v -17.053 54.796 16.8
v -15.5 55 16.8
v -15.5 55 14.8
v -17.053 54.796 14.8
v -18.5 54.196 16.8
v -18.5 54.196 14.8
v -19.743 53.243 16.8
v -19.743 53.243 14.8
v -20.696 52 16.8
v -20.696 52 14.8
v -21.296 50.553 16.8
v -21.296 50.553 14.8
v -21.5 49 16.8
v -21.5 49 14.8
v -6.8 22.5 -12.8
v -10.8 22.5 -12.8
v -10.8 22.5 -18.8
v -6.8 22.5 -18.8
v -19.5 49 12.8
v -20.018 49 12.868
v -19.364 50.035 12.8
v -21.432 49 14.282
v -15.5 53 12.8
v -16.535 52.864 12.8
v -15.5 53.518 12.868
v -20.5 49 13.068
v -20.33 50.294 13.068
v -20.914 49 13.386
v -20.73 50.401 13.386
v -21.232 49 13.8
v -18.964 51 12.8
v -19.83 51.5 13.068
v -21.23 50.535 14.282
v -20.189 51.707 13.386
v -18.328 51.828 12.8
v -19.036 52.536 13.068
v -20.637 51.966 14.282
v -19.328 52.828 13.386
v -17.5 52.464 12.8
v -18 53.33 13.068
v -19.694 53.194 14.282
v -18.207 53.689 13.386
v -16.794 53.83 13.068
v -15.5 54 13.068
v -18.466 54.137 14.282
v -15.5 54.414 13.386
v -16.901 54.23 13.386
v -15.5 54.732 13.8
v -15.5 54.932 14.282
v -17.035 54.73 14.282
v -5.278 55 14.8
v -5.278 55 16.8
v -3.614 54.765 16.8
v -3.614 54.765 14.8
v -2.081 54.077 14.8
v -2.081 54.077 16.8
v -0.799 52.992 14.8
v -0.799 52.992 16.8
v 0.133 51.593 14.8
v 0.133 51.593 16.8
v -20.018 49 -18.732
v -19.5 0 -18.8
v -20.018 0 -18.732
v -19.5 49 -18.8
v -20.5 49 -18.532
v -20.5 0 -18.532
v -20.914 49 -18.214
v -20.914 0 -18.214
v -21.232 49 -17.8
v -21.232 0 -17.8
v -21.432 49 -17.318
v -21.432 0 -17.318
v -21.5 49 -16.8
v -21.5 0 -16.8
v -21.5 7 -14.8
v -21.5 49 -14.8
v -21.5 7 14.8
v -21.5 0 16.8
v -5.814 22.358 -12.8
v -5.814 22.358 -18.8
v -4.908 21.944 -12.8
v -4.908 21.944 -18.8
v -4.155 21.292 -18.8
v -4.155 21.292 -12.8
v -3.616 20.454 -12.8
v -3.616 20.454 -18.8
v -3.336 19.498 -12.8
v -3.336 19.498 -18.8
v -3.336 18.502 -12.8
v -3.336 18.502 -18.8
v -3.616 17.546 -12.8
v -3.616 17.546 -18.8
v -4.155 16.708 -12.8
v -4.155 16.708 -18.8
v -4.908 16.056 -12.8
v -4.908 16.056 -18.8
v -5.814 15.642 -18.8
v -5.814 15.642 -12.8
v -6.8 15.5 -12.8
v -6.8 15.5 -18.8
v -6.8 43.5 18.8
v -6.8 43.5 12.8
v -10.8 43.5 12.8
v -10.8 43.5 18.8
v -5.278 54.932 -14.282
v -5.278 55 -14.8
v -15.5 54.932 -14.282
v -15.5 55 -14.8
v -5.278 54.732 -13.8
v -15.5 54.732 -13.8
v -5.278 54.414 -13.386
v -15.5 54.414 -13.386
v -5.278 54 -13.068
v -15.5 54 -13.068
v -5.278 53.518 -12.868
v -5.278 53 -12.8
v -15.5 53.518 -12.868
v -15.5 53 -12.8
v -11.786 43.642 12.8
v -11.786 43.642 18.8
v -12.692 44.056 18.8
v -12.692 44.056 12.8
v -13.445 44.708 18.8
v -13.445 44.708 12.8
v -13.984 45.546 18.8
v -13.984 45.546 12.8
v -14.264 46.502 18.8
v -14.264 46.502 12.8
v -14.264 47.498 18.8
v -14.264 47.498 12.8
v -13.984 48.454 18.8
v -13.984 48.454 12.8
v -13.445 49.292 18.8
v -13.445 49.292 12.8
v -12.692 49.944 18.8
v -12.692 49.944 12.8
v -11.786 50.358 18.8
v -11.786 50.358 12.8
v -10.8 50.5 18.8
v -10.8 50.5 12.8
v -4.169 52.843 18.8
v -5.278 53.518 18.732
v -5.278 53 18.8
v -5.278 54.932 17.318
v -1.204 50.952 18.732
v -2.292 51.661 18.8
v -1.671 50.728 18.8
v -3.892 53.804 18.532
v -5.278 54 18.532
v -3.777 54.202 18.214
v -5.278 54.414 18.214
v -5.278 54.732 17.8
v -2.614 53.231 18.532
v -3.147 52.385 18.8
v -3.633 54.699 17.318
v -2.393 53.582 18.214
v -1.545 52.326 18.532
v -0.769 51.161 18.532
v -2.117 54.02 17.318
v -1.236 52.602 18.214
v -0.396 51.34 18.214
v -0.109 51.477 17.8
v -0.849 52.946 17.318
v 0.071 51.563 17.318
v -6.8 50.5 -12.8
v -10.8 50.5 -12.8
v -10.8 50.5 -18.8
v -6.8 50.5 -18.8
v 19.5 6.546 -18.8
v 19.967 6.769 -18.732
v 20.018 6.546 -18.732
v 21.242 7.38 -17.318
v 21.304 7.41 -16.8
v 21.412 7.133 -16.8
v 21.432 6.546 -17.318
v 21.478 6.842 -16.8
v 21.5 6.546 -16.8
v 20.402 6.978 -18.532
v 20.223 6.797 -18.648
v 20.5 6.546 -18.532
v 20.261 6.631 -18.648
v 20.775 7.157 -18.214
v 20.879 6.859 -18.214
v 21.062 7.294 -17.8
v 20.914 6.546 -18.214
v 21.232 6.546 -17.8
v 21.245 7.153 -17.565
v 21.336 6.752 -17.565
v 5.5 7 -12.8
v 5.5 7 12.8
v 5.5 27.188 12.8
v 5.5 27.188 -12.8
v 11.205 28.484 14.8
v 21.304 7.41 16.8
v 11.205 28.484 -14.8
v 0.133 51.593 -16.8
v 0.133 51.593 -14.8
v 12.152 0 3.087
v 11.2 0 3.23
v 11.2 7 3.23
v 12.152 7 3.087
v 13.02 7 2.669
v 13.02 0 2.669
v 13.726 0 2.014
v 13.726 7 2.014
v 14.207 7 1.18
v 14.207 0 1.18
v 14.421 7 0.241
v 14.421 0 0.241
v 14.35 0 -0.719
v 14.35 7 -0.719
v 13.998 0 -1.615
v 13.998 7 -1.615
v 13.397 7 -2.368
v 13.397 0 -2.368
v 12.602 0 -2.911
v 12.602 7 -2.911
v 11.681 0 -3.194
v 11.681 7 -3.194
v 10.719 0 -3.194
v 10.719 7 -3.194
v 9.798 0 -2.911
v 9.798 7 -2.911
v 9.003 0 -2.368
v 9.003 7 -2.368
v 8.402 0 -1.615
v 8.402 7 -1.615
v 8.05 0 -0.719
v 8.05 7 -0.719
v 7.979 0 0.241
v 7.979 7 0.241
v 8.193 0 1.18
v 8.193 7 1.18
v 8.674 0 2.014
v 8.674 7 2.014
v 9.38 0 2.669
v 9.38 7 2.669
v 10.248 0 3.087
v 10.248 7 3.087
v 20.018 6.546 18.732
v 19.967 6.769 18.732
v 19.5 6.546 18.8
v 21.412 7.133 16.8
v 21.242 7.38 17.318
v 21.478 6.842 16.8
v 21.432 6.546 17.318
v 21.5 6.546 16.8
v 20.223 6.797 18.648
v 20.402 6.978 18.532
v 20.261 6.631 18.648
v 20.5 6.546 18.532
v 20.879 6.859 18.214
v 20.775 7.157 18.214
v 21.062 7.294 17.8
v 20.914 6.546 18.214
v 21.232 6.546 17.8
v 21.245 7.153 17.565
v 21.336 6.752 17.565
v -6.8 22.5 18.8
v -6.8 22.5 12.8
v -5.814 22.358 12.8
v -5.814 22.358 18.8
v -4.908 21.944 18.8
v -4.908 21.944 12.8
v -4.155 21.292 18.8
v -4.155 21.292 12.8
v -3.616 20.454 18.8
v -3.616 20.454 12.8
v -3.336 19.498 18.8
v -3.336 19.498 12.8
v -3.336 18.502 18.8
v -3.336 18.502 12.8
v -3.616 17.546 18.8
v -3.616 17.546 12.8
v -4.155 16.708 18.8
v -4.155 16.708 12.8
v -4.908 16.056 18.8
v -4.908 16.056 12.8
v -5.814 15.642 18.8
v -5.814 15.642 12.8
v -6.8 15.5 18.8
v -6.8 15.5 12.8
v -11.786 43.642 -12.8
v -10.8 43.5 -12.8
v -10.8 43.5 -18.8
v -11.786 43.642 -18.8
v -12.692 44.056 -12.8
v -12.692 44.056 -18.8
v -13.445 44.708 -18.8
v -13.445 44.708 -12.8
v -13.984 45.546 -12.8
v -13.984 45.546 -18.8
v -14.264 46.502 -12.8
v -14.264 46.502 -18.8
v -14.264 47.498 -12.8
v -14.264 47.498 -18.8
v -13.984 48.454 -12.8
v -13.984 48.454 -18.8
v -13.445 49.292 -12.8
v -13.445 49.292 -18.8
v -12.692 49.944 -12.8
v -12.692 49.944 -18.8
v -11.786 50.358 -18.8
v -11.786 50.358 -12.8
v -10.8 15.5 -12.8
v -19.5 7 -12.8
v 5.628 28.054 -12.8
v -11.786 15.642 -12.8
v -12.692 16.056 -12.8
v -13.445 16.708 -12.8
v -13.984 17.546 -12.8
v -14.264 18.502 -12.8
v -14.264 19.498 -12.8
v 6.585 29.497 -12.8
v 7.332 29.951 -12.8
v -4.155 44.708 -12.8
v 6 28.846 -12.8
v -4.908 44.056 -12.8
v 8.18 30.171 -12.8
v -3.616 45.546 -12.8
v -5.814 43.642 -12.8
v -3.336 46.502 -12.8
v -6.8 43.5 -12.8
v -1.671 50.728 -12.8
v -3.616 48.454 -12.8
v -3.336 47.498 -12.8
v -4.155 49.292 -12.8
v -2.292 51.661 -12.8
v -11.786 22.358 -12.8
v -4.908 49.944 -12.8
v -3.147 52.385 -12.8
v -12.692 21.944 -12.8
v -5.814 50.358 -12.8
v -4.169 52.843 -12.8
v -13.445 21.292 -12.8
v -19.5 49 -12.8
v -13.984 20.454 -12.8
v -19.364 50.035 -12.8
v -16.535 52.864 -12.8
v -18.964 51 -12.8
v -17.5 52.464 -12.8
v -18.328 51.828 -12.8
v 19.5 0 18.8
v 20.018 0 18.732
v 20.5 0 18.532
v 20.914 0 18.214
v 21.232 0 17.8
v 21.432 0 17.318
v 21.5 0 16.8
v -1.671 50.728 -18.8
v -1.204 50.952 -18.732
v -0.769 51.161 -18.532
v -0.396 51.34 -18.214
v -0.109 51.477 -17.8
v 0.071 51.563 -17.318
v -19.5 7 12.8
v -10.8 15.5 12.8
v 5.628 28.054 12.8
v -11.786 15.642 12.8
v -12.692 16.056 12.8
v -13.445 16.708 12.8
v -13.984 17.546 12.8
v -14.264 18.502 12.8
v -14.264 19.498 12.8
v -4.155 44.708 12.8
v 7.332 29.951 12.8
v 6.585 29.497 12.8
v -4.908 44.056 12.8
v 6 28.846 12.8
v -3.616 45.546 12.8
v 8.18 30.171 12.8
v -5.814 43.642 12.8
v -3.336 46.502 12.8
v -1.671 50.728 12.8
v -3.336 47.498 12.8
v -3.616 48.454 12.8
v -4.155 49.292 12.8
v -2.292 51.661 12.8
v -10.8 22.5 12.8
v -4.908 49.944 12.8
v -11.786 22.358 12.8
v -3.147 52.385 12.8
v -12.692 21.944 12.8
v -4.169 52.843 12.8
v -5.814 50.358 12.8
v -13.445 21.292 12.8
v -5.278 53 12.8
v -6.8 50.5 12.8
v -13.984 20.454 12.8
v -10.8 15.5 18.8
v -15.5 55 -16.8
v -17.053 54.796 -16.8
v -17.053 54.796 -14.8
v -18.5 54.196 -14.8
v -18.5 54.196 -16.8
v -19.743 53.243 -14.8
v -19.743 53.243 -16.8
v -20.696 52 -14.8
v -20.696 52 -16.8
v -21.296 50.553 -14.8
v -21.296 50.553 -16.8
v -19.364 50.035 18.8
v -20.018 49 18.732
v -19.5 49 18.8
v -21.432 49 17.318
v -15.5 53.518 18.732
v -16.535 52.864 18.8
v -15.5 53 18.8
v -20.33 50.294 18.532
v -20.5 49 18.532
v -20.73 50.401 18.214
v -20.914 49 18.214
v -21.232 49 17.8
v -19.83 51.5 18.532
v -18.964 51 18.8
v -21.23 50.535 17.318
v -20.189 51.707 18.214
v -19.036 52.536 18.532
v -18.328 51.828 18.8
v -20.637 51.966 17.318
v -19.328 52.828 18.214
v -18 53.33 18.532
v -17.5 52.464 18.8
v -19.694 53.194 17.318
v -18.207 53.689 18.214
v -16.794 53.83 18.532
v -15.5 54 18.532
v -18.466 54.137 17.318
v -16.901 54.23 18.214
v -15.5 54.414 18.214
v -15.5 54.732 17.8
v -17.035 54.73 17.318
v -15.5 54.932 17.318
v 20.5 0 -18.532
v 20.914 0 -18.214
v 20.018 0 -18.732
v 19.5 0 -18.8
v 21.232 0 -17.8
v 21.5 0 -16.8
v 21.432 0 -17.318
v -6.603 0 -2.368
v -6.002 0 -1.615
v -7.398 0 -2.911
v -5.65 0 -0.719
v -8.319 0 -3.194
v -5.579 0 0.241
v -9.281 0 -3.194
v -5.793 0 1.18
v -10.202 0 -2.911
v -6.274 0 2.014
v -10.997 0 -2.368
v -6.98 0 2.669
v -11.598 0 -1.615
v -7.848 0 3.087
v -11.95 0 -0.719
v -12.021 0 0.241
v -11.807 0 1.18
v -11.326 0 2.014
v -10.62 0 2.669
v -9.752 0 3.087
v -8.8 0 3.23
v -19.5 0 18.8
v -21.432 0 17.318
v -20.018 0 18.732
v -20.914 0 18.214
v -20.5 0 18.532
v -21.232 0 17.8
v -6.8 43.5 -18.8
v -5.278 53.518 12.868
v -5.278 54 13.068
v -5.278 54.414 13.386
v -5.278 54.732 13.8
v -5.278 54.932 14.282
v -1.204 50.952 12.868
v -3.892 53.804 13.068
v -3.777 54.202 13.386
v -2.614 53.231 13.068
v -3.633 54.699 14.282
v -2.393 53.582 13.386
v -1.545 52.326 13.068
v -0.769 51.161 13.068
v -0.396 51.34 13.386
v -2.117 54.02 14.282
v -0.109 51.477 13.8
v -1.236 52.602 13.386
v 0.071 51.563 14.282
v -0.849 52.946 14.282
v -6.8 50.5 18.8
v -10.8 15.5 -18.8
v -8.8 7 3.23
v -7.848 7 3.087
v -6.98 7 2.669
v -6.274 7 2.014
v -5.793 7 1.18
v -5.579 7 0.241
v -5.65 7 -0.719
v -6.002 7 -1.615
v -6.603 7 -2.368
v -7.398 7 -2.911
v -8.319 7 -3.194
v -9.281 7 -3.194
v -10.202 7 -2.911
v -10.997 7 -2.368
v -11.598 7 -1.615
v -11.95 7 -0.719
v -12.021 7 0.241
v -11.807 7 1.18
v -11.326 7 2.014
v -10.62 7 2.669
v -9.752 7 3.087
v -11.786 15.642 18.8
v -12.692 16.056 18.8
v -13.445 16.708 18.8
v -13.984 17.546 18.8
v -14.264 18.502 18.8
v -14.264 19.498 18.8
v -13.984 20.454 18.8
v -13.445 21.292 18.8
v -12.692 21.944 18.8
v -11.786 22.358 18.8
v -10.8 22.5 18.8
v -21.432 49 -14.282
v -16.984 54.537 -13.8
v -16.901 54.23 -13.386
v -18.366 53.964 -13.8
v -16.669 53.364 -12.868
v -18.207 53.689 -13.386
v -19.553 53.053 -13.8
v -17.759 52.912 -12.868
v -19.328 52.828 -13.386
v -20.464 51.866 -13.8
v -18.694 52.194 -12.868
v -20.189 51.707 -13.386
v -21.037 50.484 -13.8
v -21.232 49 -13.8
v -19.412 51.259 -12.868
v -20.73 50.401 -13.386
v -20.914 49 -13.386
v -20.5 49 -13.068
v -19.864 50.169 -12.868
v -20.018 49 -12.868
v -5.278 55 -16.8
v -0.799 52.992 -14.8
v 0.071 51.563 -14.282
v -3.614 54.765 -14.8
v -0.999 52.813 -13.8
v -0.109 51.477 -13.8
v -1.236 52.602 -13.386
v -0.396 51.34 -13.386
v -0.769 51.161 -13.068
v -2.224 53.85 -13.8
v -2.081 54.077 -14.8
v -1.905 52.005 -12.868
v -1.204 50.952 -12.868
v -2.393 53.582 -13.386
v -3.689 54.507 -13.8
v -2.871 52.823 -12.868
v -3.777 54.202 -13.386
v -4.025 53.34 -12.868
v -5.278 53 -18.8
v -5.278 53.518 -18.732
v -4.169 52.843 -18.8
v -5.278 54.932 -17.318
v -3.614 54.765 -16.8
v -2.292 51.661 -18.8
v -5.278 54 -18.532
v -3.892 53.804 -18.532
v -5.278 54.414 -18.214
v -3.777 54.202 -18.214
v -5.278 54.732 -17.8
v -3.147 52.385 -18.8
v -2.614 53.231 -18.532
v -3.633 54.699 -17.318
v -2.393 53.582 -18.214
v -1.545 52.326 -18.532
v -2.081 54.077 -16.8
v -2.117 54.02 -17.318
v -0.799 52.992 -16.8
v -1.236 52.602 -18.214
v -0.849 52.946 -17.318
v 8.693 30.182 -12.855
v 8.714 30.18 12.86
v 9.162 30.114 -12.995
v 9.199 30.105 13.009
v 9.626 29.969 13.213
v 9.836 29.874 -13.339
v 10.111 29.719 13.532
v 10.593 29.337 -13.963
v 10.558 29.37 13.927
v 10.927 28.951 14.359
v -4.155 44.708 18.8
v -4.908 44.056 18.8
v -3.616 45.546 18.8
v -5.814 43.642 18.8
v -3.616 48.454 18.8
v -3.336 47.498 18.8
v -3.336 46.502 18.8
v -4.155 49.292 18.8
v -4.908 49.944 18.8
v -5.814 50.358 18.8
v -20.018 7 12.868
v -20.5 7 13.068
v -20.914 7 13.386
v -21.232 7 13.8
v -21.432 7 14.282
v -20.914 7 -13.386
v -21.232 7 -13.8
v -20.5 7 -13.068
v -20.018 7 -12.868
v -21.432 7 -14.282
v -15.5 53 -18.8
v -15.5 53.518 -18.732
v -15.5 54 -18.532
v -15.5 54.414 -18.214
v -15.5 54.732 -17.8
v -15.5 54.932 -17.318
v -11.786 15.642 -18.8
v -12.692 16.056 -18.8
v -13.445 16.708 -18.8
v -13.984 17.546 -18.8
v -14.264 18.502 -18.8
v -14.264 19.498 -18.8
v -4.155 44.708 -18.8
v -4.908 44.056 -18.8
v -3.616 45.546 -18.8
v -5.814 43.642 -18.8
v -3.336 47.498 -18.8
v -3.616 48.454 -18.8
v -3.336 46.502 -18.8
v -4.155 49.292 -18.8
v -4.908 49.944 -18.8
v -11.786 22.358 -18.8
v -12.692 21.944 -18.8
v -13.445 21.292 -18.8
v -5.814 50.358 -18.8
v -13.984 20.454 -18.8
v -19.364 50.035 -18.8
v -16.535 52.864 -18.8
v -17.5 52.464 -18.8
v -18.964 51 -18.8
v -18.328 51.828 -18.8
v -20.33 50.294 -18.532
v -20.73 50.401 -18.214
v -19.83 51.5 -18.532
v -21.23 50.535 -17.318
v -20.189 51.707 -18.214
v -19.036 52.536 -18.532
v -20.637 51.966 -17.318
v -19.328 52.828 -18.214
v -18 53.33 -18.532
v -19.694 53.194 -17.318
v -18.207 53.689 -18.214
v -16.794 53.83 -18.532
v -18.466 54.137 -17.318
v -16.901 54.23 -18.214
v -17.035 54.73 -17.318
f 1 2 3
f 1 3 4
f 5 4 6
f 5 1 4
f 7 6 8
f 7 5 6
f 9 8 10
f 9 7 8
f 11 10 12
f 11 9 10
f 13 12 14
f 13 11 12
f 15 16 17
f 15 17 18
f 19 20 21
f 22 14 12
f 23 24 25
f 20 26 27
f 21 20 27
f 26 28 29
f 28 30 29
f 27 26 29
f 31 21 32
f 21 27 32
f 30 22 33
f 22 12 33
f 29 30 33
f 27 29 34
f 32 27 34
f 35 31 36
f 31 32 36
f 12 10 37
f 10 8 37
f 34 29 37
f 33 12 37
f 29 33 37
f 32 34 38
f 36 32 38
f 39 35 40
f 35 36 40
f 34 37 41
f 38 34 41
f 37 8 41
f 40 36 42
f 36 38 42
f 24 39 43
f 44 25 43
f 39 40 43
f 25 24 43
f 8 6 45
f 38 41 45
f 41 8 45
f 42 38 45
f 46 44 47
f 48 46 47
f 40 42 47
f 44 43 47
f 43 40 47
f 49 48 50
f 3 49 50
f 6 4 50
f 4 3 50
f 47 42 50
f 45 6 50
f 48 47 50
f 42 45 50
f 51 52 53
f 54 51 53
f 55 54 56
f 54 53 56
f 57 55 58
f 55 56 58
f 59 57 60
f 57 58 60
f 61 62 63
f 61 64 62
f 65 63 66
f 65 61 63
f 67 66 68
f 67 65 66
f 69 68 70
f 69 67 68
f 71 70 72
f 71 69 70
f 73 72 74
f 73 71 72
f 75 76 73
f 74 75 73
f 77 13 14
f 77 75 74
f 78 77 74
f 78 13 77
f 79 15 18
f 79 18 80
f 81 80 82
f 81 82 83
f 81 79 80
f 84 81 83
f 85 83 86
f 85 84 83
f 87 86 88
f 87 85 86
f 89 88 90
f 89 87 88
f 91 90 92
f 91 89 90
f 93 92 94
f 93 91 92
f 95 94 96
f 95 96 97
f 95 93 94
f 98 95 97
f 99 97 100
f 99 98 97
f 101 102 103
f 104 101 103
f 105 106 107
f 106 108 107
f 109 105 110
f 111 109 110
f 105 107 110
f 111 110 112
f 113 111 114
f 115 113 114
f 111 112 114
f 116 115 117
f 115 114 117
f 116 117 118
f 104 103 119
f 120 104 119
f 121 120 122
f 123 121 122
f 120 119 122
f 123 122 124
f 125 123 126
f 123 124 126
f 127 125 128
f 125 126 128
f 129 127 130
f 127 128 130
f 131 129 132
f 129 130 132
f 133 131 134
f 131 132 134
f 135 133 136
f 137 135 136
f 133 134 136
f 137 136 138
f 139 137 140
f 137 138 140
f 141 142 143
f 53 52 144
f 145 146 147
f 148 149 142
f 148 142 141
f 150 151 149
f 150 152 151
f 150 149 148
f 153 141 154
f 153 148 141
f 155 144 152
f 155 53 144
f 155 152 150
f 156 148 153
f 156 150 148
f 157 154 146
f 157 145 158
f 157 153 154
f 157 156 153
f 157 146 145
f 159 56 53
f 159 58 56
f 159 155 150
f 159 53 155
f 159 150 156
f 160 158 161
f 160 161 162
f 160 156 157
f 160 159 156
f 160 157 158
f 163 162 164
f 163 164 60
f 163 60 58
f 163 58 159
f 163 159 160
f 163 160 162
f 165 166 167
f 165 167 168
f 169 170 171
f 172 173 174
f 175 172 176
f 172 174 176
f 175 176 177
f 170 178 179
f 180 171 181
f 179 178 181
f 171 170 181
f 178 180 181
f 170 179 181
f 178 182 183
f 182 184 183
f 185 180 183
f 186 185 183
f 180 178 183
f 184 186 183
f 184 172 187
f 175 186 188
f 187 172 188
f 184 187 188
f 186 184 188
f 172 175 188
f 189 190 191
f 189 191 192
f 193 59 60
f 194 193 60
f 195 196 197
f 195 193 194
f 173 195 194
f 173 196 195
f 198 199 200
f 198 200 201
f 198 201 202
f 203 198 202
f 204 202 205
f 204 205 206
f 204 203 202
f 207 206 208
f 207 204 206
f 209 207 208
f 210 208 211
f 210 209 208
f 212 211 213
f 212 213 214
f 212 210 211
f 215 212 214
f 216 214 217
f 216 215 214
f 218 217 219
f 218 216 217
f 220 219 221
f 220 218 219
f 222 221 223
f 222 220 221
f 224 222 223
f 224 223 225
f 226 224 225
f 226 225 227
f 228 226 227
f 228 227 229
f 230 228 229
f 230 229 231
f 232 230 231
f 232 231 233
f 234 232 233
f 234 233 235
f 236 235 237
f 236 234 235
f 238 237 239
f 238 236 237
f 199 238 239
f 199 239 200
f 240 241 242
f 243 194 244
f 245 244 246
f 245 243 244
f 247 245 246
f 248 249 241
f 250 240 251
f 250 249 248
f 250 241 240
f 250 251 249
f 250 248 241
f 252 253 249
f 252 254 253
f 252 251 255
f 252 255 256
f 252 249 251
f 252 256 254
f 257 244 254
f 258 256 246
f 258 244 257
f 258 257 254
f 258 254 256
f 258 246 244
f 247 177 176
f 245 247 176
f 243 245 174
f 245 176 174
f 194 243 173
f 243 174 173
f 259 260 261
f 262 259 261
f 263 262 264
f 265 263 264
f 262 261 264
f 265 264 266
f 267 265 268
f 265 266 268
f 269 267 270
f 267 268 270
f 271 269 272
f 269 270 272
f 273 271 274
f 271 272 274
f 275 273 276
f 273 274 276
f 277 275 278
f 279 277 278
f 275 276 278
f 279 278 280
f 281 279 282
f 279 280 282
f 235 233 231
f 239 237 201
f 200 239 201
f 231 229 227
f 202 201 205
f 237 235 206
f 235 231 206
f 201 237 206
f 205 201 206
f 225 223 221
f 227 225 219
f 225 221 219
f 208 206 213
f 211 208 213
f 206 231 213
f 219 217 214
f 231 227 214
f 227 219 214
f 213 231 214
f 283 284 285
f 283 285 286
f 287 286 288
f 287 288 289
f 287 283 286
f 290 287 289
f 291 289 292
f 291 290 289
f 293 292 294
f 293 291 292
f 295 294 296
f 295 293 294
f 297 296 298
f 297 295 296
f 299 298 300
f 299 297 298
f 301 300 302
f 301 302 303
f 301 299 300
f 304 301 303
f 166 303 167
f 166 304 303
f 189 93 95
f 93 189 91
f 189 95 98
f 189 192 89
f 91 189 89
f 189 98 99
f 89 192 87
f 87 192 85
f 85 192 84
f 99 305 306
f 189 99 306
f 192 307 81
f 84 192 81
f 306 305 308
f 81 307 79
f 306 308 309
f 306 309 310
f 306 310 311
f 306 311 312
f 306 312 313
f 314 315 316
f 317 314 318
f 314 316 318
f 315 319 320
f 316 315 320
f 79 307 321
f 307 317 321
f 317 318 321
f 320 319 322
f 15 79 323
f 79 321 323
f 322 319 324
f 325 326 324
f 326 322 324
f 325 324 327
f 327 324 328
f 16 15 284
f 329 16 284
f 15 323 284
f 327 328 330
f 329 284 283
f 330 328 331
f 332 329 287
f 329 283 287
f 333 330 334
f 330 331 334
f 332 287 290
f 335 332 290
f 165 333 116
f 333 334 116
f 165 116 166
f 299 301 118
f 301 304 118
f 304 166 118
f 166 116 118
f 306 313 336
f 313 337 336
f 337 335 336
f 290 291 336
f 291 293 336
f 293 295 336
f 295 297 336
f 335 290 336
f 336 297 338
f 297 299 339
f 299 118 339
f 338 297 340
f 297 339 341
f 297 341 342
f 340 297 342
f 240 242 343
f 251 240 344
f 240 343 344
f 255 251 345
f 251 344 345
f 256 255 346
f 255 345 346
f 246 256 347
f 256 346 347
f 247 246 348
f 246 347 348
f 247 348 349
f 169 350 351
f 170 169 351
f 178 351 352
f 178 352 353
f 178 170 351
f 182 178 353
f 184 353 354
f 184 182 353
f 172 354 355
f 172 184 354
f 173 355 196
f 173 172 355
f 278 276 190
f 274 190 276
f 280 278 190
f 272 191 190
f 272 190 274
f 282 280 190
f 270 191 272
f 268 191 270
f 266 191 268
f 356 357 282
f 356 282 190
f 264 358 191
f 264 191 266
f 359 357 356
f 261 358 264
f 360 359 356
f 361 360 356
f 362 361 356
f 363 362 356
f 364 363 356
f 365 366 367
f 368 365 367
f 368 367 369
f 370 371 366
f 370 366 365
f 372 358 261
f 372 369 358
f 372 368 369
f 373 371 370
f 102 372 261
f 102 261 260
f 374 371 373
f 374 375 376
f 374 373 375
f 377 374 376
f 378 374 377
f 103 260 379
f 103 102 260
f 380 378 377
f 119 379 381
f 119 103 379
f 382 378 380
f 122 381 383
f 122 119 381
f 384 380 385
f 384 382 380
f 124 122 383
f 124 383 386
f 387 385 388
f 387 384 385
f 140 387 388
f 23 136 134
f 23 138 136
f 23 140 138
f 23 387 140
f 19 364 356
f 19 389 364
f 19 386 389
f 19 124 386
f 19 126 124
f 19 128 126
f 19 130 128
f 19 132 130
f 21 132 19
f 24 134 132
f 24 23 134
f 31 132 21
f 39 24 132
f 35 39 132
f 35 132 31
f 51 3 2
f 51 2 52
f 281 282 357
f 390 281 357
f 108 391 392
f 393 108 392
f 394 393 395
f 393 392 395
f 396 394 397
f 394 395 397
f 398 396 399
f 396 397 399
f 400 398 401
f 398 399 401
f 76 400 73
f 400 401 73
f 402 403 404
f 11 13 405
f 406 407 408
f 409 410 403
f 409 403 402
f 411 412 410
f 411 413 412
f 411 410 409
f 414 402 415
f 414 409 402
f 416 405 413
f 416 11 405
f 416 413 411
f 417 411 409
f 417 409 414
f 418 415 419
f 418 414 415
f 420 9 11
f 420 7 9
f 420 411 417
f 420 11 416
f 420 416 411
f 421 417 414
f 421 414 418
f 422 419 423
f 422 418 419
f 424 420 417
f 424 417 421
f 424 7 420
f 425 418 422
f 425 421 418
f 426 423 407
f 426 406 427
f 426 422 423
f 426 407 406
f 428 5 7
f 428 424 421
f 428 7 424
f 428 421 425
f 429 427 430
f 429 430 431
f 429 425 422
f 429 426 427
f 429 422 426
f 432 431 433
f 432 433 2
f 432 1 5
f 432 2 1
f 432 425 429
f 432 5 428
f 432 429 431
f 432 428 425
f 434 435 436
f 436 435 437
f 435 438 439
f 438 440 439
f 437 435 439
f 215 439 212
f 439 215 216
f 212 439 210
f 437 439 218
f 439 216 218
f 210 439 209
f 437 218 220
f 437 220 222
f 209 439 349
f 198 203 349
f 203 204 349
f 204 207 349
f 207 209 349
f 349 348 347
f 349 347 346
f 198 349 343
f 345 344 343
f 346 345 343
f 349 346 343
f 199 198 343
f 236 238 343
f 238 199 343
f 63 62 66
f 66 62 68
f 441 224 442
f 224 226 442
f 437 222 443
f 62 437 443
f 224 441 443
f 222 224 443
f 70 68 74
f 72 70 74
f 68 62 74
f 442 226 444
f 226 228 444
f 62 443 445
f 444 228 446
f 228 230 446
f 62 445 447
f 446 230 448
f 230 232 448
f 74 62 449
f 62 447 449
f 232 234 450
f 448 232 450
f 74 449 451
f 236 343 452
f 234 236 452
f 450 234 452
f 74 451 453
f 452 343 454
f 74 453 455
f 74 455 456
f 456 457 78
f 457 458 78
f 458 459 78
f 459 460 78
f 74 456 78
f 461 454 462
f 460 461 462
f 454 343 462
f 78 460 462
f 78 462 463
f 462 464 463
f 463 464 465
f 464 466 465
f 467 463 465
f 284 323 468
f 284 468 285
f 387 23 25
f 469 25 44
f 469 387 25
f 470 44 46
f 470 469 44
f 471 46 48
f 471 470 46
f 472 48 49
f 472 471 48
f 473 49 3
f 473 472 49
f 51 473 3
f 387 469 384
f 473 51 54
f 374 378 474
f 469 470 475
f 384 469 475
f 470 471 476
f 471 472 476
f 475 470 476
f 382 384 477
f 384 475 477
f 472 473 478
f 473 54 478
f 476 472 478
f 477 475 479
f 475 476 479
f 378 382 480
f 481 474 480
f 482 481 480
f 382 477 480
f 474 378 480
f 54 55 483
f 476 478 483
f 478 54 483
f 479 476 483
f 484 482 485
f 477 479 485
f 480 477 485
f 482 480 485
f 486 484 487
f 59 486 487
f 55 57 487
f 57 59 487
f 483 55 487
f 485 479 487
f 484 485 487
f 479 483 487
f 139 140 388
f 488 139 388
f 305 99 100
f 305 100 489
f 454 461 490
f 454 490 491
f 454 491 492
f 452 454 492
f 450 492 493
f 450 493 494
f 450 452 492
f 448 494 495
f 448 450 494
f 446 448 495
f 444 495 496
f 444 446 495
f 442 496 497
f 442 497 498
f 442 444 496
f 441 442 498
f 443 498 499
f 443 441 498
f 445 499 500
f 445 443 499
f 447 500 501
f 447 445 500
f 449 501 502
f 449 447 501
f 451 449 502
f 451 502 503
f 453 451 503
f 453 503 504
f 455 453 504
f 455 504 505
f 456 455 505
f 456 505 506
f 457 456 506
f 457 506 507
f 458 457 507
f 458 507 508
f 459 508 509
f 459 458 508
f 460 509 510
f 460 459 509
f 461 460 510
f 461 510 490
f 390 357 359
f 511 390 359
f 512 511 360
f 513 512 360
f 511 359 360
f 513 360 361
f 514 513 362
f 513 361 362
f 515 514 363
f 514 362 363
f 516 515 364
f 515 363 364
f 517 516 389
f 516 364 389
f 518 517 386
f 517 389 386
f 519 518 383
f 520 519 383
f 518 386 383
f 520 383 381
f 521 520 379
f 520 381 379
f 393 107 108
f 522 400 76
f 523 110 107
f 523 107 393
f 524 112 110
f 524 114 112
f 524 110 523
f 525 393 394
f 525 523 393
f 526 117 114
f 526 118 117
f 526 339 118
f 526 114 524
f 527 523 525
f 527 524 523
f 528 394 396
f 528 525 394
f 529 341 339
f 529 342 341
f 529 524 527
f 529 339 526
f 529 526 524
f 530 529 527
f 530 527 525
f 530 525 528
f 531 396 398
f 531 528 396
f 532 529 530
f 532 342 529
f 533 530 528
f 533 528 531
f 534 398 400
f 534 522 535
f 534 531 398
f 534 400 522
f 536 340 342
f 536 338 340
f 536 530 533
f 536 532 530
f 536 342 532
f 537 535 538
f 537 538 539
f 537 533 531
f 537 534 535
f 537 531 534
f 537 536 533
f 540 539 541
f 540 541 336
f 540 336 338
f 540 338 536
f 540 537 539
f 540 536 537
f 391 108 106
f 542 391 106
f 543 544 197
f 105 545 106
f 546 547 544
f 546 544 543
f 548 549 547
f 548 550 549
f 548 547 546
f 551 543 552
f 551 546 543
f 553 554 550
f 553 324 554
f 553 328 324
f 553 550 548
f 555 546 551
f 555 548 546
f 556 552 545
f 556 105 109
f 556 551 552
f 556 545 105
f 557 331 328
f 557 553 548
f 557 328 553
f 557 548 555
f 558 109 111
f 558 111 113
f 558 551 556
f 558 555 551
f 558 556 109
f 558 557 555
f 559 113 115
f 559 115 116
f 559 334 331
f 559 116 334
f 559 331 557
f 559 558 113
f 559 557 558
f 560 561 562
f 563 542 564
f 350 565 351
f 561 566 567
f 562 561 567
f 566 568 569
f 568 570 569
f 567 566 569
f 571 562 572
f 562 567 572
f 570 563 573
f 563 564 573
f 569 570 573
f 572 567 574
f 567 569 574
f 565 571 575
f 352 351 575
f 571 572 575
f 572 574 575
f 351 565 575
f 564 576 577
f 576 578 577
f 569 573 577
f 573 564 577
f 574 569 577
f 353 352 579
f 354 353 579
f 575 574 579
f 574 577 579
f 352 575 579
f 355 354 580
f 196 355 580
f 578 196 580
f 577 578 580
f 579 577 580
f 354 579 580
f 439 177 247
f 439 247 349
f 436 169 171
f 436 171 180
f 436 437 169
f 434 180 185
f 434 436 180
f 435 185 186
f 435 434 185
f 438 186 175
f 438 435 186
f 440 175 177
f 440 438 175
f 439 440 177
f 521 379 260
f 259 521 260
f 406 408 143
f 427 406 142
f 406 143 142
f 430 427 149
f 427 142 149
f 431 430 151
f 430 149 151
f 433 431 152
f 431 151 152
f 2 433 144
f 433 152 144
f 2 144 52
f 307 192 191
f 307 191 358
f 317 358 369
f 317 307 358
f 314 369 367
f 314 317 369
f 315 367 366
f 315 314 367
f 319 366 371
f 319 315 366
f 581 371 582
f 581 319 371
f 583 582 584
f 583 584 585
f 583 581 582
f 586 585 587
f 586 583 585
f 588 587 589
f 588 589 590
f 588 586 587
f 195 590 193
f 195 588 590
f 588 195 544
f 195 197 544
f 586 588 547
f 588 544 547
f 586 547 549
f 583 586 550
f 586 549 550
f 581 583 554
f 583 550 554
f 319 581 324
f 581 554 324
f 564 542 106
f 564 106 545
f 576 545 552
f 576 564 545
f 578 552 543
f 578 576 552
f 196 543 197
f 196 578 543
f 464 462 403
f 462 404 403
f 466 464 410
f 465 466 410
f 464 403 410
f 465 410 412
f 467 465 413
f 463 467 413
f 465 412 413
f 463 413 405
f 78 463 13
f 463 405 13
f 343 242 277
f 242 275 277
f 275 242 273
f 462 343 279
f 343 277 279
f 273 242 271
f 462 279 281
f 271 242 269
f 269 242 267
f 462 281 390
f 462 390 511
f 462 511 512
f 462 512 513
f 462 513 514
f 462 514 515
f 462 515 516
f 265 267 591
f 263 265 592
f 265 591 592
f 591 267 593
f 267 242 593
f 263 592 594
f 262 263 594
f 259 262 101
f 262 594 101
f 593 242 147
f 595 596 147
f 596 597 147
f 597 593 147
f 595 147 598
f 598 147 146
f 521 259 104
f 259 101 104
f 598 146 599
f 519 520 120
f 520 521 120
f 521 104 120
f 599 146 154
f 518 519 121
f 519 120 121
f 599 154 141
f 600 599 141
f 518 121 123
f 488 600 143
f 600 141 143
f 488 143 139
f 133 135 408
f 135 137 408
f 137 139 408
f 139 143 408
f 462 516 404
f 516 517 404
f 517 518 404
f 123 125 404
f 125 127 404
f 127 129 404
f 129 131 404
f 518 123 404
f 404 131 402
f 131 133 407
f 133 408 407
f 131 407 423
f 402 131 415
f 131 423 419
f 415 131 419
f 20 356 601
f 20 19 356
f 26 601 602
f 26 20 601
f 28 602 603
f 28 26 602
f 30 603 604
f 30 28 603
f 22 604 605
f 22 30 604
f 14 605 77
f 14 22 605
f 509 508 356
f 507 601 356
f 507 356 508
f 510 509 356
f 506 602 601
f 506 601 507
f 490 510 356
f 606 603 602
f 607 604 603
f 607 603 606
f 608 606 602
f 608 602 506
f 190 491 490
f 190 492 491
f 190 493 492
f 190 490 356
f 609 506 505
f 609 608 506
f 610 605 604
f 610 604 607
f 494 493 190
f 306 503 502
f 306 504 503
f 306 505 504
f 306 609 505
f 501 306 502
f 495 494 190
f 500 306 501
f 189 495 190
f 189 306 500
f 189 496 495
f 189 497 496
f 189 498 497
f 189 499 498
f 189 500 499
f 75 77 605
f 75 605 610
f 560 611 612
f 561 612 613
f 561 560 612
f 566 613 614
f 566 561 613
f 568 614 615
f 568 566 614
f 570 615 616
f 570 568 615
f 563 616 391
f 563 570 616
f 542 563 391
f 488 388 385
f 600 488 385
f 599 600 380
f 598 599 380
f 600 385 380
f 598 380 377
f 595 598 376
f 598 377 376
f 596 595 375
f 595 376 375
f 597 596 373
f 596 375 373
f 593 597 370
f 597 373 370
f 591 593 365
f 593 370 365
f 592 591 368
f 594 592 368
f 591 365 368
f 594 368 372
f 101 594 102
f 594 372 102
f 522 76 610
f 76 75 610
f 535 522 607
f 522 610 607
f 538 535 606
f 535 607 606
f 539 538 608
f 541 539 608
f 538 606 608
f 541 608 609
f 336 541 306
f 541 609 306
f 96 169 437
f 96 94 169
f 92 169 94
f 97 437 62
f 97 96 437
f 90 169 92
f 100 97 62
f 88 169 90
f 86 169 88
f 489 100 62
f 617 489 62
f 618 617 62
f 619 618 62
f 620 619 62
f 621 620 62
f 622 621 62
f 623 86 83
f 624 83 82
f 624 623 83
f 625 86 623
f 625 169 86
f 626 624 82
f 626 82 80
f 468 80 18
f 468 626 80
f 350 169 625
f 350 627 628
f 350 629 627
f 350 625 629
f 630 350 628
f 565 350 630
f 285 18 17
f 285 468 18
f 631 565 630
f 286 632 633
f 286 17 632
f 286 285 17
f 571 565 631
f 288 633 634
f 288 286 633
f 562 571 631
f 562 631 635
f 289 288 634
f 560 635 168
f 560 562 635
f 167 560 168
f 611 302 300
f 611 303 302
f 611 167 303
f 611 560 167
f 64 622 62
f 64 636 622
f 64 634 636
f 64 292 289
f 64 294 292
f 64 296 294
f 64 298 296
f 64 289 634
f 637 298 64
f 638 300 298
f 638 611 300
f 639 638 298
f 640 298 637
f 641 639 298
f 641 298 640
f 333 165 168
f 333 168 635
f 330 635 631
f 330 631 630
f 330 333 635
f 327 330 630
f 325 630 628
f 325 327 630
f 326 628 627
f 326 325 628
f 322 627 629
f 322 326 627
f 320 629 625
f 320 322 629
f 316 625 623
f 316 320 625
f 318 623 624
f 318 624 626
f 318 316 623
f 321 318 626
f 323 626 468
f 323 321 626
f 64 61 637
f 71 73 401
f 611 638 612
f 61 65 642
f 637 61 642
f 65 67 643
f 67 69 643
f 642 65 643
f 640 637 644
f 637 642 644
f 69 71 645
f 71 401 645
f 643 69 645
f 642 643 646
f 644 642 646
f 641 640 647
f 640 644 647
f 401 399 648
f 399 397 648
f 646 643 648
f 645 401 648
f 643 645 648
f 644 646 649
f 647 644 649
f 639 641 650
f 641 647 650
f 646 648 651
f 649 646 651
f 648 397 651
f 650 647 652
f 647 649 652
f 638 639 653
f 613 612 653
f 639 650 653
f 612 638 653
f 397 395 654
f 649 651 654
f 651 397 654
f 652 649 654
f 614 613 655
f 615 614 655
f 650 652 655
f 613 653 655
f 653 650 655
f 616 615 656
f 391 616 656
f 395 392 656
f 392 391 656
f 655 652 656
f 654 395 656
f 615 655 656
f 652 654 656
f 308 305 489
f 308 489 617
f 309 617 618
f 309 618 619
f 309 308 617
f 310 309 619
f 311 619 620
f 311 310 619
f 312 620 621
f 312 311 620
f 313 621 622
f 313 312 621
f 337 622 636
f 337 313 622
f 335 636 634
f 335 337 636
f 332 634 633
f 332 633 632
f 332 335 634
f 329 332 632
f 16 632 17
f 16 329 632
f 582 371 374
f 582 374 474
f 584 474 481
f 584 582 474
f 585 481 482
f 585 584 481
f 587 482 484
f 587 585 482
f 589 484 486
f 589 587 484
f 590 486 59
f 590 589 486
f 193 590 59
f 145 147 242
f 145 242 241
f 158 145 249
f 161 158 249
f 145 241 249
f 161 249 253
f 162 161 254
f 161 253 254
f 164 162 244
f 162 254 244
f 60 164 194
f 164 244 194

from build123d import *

# Parameters (mm, degrees)
SKETCH1_W           = 43
SKETCH1_H           = 25.6
SKETCH1_R           = 3.2305
BOSS_EXTRUDE1_DEPTH = 7
BOSS_EXTRUDE2_DEPTH = 6
FILLET1_R           = 6
BOSS_EXTRUDE3_REACH = 57.854
SKETCH3_W           = 16
SKETCH3_H           = 25.6
FILLET2_R           = 3
FILLET3_R           = 2


with BuildPart() as part:
    # Sketch1 → Boss-Extrude1 (new body)
    with BuildSketch(Plane(origin=(0, 0, 0), x_dir=(1, 0, 0), z_dir=(0, 1, 0))):
        Rectangle(SKETCH1_W, SKETCH1_H)
        with Locations(Location((-8.8, 0, 0), (0, 0, 270))):
            Circle(SKETCH1_R, mode=Mode.SUBTRACT)
        with Locations(Location((11.2, 0, 0), (0, 0, 270))):
            Circle(SKETCH1_R, mode=Mode.SUBTRACT)
    extrude(amount=BOSS_EXTRUDE1_DEPTH)

    # Sketch2 → Boss-Extrude2 (add)
    with BuildSketch(Plane.XY.offset(12.8)):
        Polygon((21.5, 7), (21.5, 0), (-21.5, 0), (-21.5, 7), (-21.5, 55), (-1.5, 55), align=None)
        with BuildLine():
            Line((-10.8, 50.5), (-6.8, 50.5))
            ThreePointArc((-6.8, 50.5), (-3.3, 47), (-6.8, 43.5))
            Line((-6.8, 43.5), (-10.8, 43.5))
            ThreePointArc((-10.8, 43.5), (-14.3, 47), (-10.8, 50.5))
        make_face(mode=Mode.SUBTRACT)
        with BuildLine():
            Line((-10.8, 22.5), (-6.8, 22.5))
            ThreePointArc((-6.8, 22.5), (-3.3, 19), (-6.8, 15.5))
            Line((-6.8, 15.5), (-10.8, 15.5))
            ThreePointArc((-10.8, 15.5), (-14.3, 19), (-10.8, 22.5))
        make_face(mode=Mode.SUBTRACT)
    boss_extrude2 = extrude(amount=BOSS_EXTRUDE2_DEPTH)

    # Mirror1: Boss-Extrude2 across plane
    add(boss_extrude2.mirror(Plane.XY))

    # Fillet1
    fillet1_edges = [part.edges().sort_by_distance(p)[0] for p in [
        (-1.5, 55, 15.8),
        (-21.5, 55, 15.8),
        (-1.5, 55, -15.8),
        (-21.5, 55, -15.8),
    ]]
    fillet(fillet1_edges, radius=FILLET1_R)

    # Boss-Extrude3: up to this face of the body (flat: up to its plane)
    boss_extrude3_end = Plane(part.part.faces().sort_by_distance((10.816327241, 29.296360541, -15.8))[0])
    # Sketch3 → Boss-Extrude3 (add, up to the picked face)
    with BuildSketch(Plane(origin=(0, 7, 0), x_dir=(1, 0, 0), z_dir=(0, 1, 0)), mode=Mode.PRIVATE) as boss_extrude3_sk1:
        with Locations((13.5, 0)):
            Rectangle(SKETCH3_W, SKETCH3_H)
    boss_extrude3_tool1 = split(extrude(boss_extrude3_sk1.sketch, amount=BOSS_EXTRUDE3_REACH, mode=Mode.PRIVATE), bisect_by=boss_extrude3_end, keep=Keep.BOTH, mode=Mode.PRIVATE)
    add(boss_extrude3_tool1.solids().sort_by(Axis((13.5, 7, 0), (0, 1, 0)))[0])

    # Fillet2
    fillet2_edges = [part.edges().sort_by_distance(p)[0] for p in [
        (5.5, 40.391304348, 0),
    ]]
    fillet(fillet2_edges, radius=FILLET2_R)

    # Fillet3
    fillet3_edges = [part.edges().sort_by_distance(p)[0] for p in [
        (-2.081080958, 54.077220031, 18.8),
        (-19.742640687, 53.242640687, 18.8),
        (5.669051284, 40.038501669, -12.8),
        (5.669051284, 40.038501669, 12.8),
        (10.816327241, 29.296360541, 18.8),
        (21.5, 3.5, 18.8),
        (21.5, 7, 0),
        (10.816327241, 29.296360541, -18.8),
        (21.5, 3.5, -18.8),
        (-10.389120846, 55, -12.8),
        (-10.389120846, 55, -18.8),
        (-21.5, 28, -12.8),
        (-2.081080958, 54.077220031, -12.8),
        (-19.742640687, 53.242640687, -12.8),
        (-21.5, 24.5, 18.8),
        (-21.5, 28, 12.8),
        (-21.5, 24.5, -18.8),
        (-2.081080958, 54.077220031, -18.8),
        (-19.742640687, 53.242640687, -18.8),
        (-10.389120846, 55, 12.8),
        (-2.081080958, 54.077220031, 12.8),
        (-19.742640687, 53.242640687, 12.8),
        (-10.389120846, 55, 18.8),
    ]]
    fillet(fillet3_edges, radius=FILLET3_R)


solid = part.part
